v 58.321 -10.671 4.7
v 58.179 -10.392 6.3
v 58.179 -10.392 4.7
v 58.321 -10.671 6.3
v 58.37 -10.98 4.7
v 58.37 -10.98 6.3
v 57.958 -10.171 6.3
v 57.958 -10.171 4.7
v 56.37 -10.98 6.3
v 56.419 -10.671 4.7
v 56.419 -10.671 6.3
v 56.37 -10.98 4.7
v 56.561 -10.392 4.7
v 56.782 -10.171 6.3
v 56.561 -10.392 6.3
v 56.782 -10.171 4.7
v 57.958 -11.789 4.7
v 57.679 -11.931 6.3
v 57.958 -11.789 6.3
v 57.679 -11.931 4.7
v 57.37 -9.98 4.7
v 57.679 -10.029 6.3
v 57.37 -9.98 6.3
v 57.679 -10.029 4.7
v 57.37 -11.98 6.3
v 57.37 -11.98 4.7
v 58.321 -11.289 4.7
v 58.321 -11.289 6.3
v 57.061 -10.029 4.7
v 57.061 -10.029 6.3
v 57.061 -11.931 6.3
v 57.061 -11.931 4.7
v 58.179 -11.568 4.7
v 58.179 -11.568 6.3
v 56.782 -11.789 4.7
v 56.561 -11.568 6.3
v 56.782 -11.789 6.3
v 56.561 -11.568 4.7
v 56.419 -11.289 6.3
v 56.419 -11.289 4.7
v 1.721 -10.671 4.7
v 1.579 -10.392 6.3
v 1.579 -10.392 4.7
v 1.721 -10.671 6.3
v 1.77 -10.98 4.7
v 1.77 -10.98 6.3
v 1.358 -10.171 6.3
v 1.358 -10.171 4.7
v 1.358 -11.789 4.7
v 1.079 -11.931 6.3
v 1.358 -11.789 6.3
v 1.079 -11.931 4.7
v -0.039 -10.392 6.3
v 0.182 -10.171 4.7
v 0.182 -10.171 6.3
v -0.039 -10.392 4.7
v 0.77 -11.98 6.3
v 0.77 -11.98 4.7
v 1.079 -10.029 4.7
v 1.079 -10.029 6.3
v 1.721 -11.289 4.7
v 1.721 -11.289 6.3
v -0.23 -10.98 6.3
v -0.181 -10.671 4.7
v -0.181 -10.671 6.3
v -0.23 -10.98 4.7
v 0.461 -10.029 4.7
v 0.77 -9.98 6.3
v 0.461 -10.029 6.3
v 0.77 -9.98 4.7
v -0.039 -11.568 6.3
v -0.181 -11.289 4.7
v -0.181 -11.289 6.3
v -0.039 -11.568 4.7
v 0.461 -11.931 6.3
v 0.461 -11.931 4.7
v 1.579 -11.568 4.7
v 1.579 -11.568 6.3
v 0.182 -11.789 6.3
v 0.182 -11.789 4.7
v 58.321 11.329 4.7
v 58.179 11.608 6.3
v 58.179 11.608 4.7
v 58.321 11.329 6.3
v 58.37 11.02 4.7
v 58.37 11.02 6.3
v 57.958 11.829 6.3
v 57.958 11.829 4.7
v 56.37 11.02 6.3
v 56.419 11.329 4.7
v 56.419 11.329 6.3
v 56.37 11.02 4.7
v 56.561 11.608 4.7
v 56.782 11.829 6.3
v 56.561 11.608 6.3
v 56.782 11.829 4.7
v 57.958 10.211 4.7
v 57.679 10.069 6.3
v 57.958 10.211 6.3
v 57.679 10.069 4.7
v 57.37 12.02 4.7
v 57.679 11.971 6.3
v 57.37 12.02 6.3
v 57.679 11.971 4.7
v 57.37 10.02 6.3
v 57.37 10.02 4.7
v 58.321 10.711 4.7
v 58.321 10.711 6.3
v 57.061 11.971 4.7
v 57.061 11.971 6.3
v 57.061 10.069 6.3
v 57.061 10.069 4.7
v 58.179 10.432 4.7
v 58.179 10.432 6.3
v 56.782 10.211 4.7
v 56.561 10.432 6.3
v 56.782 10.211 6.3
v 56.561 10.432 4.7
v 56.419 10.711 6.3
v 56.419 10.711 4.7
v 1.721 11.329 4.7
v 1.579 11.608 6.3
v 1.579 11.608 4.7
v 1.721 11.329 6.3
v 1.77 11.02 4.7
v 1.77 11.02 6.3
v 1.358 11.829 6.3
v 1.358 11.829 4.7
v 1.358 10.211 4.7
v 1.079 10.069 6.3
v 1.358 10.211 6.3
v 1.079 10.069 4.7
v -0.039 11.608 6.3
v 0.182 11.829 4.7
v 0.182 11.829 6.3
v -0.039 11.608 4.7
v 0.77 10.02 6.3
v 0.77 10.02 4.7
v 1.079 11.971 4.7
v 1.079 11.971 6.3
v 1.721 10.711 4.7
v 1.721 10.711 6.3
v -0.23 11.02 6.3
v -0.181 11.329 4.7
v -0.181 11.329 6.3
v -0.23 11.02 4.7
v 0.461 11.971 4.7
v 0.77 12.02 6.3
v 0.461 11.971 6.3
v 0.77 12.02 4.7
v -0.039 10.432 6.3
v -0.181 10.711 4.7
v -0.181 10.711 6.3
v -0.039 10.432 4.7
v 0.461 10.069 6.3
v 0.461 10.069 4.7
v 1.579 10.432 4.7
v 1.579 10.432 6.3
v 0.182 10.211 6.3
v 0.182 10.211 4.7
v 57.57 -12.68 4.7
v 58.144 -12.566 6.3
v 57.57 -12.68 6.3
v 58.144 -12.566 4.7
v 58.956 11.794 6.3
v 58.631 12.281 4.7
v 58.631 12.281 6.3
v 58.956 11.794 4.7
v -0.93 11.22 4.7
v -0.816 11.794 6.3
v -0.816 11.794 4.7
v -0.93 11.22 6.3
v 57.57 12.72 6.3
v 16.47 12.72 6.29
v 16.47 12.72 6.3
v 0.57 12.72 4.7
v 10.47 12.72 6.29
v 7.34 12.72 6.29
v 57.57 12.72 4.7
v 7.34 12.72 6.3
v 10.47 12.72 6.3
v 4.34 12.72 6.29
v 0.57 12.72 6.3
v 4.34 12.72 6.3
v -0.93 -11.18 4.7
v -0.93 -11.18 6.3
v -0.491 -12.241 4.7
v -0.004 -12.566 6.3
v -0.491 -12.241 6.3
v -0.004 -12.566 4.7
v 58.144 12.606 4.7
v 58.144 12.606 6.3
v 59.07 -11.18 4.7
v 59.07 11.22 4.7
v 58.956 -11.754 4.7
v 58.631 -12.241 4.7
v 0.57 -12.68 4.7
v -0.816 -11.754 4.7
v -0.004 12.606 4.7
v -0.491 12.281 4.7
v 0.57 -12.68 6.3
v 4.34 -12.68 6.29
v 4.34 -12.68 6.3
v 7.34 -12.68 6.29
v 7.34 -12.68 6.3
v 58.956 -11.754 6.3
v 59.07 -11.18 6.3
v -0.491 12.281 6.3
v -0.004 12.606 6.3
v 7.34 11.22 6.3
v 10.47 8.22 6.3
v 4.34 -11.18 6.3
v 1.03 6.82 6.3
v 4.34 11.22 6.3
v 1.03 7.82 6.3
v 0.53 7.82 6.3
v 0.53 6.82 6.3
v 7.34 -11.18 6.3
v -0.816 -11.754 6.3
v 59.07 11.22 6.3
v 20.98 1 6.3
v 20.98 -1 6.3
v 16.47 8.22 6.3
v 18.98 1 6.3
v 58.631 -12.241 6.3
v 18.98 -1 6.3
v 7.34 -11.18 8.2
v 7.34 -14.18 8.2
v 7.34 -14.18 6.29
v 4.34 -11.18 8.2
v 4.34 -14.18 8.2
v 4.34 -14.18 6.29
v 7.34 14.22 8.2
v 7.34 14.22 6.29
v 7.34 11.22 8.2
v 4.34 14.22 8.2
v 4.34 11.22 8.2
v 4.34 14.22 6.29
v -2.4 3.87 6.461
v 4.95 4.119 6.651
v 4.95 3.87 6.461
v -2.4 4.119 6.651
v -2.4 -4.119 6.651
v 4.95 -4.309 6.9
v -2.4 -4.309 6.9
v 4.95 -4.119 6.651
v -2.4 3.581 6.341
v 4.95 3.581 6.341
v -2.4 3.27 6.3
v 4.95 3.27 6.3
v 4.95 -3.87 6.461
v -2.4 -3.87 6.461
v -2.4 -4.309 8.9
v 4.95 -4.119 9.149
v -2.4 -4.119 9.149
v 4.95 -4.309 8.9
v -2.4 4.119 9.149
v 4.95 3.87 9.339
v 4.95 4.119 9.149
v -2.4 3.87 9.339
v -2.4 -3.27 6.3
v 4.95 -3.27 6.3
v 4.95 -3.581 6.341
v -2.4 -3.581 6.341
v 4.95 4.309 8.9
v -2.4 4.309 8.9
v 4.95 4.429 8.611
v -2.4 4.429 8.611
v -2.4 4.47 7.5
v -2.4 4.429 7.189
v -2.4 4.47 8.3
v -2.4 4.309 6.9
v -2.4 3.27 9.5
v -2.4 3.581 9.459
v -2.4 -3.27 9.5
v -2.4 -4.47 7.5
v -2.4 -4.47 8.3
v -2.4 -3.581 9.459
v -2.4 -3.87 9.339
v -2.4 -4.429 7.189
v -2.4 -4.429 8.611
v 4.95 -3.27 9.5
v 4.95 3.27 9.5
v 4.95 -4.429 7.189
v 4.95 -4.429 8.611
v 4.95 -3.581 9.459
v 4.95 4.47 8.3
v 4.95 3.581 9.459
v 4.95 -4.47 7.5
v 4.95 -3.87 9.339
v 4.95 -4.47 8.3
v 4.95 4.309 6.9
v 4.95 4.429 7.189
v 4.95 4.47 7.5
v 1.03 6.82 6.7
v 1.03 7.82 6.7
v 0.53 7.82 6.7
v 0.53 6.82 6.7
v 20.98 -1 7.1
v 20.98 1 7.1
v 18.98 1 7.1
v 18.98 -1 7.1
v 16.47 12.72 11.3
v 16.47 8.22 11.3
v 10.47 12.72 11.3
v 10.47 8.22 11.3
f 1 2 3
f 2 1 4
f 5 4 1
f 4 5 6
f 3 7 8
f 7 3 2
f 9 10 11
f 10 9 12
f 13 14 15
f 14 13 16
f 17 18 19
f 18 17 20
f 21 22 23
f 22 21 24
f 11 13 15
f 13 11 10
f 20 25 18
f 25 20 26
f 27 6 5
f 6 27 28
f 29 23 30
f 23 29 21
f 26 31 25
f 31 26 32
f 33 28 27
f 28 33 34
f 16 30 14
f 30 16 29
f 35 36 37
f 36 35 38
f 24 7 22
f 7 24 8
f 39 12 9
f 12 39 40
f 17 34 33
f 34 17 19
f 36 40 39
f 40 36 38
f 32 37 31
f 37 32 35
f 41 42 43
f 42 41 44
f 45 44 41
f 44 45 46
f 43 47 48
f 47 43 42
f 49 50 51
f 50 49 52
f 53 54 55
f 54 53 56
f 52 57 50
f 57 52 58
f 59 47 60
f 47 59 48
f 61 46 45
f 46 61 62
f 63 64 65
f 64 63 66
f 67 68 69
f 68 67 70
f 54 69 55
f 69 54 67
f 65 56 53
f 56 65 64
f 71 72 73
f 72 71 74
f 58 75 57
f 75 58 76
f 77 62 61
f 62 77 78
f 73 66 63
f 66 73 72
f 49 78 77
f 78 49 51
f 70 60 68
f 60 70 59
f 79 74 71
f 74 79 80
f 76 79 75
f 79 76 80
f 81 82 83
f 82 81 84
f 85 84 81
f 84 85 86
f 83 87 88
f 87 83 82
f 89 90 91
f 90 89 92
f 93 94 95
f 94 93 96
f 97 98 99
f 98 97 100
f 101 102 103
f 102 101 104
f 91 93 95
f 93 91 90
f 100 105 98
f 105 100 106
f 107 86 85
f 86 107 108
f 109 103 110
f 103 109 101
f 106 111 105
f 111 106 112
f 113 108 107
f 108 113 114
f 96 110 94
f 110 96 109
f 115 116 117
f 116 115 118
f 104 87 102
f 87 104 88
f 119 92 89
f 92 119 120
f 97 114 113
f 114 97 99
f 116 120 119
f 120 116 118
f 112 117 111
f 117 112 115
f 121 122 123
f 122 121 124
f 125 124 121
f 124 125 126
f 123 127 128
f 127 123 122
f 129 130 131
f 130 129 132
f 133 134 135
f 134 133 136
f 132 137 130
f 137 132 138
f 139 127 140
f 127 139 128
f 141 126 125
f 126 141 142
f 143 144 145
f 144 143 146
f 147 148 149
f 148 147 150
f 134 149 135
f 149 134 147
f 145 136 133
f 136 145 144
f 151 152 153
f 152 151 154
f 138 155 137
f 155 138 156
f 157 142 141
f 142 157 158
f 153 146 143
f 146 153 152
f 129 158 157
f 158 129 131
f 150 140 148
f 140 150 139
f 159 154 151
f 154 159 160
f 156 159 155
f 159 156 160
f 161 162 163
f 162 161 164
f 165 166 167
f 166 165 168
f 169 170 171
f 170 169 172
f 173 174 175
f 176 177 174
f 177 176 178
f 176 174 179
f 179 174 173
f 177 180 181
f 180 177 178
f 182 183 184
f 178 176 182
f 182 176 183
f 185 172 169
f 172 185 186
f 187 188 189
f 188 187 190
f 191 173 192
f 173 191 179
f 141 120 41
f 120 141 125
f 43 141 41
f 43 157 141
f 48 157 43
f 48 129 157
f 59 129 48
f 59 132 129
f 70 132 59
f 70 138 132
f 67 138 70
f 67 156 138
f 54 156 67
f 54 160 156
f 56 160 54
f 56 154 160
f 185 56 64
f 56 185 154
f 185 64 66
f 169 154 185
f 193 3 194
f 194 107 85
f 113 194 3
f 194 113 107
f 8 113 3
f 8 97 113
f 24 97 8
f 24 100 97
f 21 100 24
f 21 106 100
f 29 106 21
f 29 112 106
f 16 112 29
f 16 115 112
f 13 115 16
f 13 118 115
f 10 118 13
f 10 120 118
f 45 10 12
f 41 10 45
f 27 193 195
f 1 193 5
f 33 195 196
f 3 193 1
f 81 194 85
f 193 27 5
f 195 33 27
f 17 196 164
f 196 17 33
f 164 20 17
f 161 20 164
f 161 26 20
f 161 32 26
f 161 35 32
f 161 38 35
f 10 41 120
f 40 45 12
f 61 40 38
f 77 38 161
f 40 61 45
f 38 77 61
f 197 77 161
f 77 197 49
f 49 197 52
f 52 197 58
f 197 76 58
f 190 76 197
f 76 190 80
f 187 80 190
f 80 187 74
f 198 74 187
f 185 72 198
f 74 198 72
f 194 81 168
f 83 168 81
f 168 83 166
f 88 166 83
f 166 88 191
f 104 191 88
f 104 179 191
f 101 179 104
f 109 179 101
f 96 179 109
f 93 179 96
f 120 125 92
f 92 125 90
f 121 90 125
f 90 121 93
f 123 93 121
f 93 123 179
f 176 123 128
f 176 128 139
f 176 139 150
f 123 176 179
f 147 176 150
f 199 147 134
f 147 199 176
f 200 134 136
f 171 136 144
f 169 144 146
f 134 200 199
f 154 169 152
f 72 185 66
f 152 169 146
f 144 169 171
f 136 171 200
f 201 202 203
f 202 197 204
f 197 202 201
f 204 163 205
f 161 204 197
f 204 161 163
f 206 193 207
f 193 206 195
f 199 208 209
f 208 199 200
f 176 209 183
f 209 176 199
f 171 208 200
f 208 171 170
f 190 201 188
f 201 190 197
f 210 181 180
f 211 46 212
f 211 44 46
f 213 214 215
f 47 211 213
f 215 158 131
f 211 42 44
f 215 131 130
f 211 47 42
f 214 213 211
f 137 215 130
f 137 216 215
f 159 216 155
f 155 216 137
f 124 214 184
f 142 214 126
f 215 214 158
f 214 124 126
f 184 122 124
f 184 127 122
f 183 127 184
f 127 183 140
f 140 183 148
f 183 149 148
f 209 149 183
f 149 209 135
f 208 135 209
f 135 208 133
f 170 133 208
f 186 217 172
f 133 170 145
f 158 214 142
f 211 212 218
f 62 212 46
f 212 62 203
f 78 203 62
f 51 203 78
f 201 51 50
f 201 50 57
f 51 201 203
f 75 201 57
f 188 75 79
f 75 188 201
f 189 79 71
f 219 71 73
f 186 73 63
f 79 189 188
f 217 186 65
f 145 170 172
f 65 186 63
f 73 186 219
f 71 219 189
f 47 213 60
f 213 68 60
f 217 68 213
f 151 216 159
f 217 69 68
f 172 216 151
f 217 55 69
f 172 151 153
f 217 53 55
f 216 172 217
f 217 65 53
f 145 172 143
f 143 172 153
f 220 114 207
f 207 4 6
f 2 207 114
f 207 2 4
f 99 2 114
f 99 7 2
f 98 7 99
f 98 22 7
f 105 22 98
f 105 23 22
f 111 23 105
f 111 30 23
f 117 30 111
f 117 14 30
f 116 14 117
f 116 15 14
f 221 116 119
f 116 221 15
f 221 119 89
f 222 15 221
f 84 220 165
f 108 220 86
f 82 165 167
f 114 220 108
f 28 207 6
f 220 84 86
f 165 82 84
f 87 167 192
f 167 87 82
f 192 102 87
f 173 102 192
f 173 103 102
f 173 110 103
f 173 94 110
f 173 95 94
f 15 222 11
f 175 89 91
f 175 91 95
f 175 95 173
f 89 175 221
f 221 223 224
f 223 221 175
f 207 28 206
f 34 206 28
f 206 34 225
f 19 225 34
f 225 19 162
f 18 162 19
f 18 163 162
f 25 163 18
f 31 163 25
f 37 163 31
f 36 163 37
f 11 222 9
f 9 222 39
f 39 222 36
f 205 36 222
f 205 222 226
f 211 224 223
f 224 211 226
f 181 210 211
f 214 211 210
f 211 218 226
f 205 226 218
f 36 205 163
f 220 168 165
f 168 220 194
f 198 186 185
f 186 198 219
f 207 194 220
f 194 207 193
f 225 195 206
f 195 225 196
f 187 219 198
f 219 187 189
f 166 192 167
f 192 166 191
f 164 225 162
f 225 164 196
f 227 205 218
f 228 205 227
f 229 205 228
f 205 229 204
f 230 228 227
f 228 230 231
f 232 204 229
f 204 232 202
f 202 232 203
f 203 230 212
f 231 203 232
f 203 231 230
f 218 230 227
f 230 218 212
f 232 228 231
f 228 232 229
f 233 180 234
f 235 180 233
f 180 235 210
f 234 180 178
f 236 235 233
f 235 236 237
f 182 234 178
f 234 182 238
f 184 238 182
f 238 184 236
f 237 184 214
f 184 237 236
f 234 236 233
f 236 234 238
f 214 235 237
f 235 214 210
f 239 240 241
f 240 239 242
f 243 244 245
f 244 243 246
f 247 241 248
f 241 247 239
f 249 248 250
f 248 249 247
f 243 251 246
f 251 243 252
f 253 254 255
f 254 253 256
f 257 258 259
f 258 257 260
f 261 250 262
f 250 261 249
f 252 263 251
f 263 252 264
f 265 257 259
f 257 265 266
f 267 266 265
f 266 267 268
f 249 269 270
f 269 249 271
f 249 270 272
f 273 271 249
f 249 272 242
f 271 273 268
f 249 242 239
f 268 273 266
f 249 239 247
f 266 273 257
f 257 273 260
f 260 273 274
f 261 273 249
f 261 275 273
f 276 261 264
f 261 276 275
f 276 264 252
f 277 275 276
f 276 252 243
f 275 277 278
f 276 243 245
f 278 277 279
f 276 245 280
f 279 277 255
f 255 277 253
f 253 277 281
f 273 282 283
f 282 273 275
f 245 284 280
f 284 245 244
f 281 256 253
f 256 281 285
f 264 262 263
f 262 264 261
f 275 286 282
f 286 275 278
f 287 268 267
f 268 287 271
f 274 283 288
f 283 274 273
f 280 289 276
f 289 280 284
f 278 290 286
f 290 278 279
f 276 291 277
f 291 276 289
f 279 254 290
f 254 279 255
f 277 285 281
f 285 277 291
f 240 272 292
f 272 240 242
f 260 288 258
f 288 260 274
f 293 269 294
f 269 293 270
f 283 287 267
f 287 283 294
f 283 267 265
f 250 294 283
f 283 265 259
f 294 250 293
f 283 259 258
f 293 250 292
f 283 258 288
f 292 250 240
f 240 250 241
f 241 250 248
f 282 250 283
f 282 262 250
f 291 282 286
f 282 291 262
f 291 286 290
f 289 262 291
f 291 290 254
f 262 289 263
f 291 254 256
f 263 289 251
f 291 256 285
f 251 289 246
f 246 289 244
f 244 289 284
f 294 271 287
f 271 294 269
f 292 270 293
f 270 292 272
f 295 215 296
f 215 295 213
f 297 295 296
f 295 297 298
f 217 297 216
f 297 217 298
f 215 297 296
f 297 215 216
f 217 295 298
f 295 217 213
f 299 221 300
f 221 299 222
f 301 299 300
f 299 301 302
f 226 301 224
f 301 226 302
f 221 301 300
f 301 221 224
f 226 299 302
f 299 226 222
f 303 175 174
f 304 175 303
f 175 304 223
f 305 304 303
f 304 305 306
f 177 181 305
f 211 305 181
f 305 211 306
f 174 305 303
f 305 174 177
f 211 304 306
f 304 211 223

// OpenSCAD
// file: ../../screw-post/screw-post.scad
//-----------------------------------------------------------------------
// Screw post: a round post off the floor that a board screws down onto
//
// Two ways to fix:
//   "nut"  clearance hole through the post and floor; the nut sits in a hex
//          trap in the floor's underside, so the screw goes in from the top
//   "tap"  a pilot hole the screw cuts its own thread in (one or two fittings
//          in PLA/PETG); blind, the floor stays whole underneath
// and "head" for a screw up from below (head in a counterbore, nut on top).
//
// Modules, all in the same frame:
//   screwPostGhost()     the screw (and nut), for previews
//   screwPost()          the post: add to the floor
//   screwPostFloorCut()  subtract from the floor: nut trap / counterbore and hole
//
// Frame: origin on the floor top, on the post's axis. Z up; the floor is
// Z = -floorThick .. 0. Units: mm.
//
// Sizes: "M2", "M2.5", "M3". screwPostScrew(size, ...) says which screw length
// reaches, so a project can assert it has that screw in the kit.
//-----------------------------------------------------------------------

//-- [name, screw Ø, nut across flats, nut thick, head Ø, head height, tap hole, post Ø]
//-- Nuts ISO 4032; heads ISO 7380 button. Tap holes: the usual ~0.8 x Ø for plastic
screwSizes = [
  ["M2",   2.0, 4.0, 1.6, 3.5, 1.1, 1.6, 5.0],
  ["M2.5", 2.5, 5.0, 2.0, 4.4, 1.4, 2.1, 6.0],    // head 4.4: measured on the kit's M2.5 (controller base)
  ["M3",   3.0, 5.5, 2.4, 5.7, 1.65, 2.5, 7.0],
];

screwHoleClear = 0.4;     // added to the screw Ø for a clearance hole
screwNutClear  = 0.3;     // CAL: across flats, nut trap over the nut. Set by the fit piece
screwTapClear  = 0.0;     // CAL: added to the tap hole. Set by the fit piece
screwHeadClear = 0.6;     // counterbore over the head Ø

function screwSize(size) = let (i = search([size], screwSizes)[0])
  assert(i != [] && i != undef, str("unknown screw size ", size)) screwSizes[i];
function screwDia(size)    = screwSize(size)[1];
function screwNutAF(size)  = screwSize(size)[2];
function screwNutH(size)   = screwSize(size)[3];
function screwHeadDia(size)= screwSize(size)[4];
function screwHeadH(size)  = screwSize(size)[5];
function screwPostDia(size)= screwSize(size)[7];

//-- Shortest screw that fills the nut, from the top of the clamped part (h + clamp
//-- above the floor) down to the nut trap's underside. Round up to a length you have.
function screwPostScrew(size, h, floorThick, clamp = 1.6) = h + clamp + floorThick;

module screwPostGhost(size, h, floorThick, clamp = 1.6, length, how = "nut")
{
  d = screwDia(size);
  L = is_undef(length) ? screwPostScrew(size, h, floorThick, clamp) : length;
  top = h + clamp;
  if (how == "head")
  {
    %color("Silver") translate([0, 0, -floorThick]) cylinder(d = screwHeadDia(size), h = screwHeadH(size), $fn = 24);
    %color("Silver") translate([0, 0, -floorThick + screwHeadH(size)]) cylinder(d = d, h = L, $fn = 16);
  }
  else
  {
    %color("Silver") translate([0, 0, top]) cylinder(d = screwHeadDia(size), h = screwHeadH(size), $fn = 24);
    %color("Silver") translate([0, 0, top - L]) cylinder(d = d, h = L, $fn = 16);
    if (how == "nut")
      %color("DimGray") translate([0, 0, -floorThick]) rotate([0, 0, 30]) cylinder(d = screwNutAF(size)/cos(30), h = screwNutH(size), $fn = 6);
  }
}

//-- how: "nut" | "head" (through hole) or "tap" (blind pilot hole). postDia defaults by size
module screwPost(size, h, how = "nut", postDia, tapClear = screwTapClear)
{
  pd = is_undef(postDia) ? screwPostDia(size) : postDia;
  hole = how == "tap" ? screwSize(size)[6] + tapClear : screwDia(size) + screwHoleClear;
  difference()
  {
    translate([0, 0, -0.01]) cylinder(d = pd, h = h + 0.01, $fn = 40);
    translate([0, 0, how == "tap" ? 0.6 : -1]) cylinder(d = hole, h = h + 2, $fn = 24);
    //-- lead-in so the screw starts square
    translate([0, 0, h - 0.4]) cylinder(d1 = hole, d2 = hole + 0.8, h = 0.41, $fn = 24);
  }
}

//-- "nut": hex trap from the underside, opening a little over the nut so it sits flush.
//-- "head": counterbore for the head. "tap": nothing.
module screwPostFloorCut(size, floorThick, how = "nut", nutClear = screwNutClear)
{
  d = screwDia(size) + screwHoleClear;
  if (how == "nut")
  {
    af = screwNutAF(size) + nutClear;
    translate([0, 0, -floorThick - 1]) rotate([0, 0, 30]) cylinder(d = af/cos(30), h = screwNutH(size) + 0.1 + 1, $fn = 6);
    translate([0, 0, -floorThick - 1]) cylinder(d = d + 0.4, h = floorThick + 2, $fn = 24);
  }
  if (how == "head")
  {
    translate([0, 0, -floorThick - 1]) cylinder(d = screwHeadDia(size) + screwHeadClear, h = screwHeadH(size) + 0.2 + 1, $fn = 32);
    translate([0, 0, -floorThick - 1]) cylinder(d = d + 0.4, h = floorThick + 2, $fn = 24);
  }
  assert(how == "tap" || floorThick >= (how == "nut" ? screwNutH(size) : screwHeadH(size)) + 0.1 + 0.3,
         str("floor too thin for the ", size, " ", how));
}
// file: ../../usb-c-port/usb-c-port.scad
//-----------------------------------------------------------------------
// USB-C port through a wall, flush: the socket's metal shell sits in a
// close-fitting pocket in the wall, walled in on all four sides, its face
// level with the outside. The cable seats the way it does on a laptop.
//
// A board's socket only overhangs the board edge by a mm or so, less than
// the wall. So the board's end tucks into a shallow relief in the wall's
// inner face, the width of the board, leaving the wall round the socket
// thin enough for the face to reach the outside. When that would leave less
// than usbcMinWall (a socket that barely overhangs), the face sits back from
// the outside instead: usbcRecess() says how far.
//
// Modules, all in the same frame:
//   usbcGhost()     the socket and the board's end, for previews
//   usbcWallCut()   subtract from the wall: socket pocket and board relief
//
// Frame: origin on the floor top at the wall's inner face, under the socket's
// axis. +X into the box, Z up. The wall is X = -wall .. 0. The board is
// component side up, socket on top (top-mount, as on the FireBeetle, C3 Super
// Mini and S3 DevKitC). Units: mm.
//
// usbcBoardEdgeX() gives where the board's edge lands (negative: inside the
// wall), so a holder can put its posts or pocket to match.
//-----------------------------------------------------------------------

//-- The socket: USB-C receptacle shell (USB-IF 8.34 x 2.56 plug, receptacle shell ~8.94 x 3.26)
usbcShellW     = 8.94;
usbcShellH     = 3.26;    // CAL per board: measured 3.2 on the FireBeetle
usbcShellR     = 1.2;     // CAL: end radius. Full round would be 1.63; most shells are squarer
usbcShellDepth = 7.35;    // face to back

//-- The pocket
usbcClearance  = 0.15;    // CAL: per side, shell to pocket. Set by the fit piece
usbcMinWall    = 1.0;     // thinnest wall left round the socket
usbcReliefGap  = 0.3;     // board relief over the board, each side and above/below
usbcChamfer    = 0.3;     // lead-in on the outside edge

//-- How far the socket face sits back from the outside: 0 (flush) unless the socket
//-- overhangs the board edge by less than usbcMinWall
function usbcRecess(overhang, minWall = usbcMinWall) = max(0, minWall - overhang);
//-- X of the board's socket edge in this frame
function usbcBoardEdgeX(wall, overhang, recess) =
  -wall + (is_undef(recess) ? usbcRecess(overhang) : recess) + overhang;
//-- Z of the board's underside above the floor top
function usbcBoardZ(axisZ, pcb, shellH = usbcShellH) = axisZ - shellH/2 - pcb;

module usbcShell2D(grow = 0, w = usbcShellW, h = usbcShellH, r = usbcShellR)
{
  offset(r = r + grow, $fn = 24) square([w - 2*r, h - 2*r], center = true);
}

//-- axisZ: socket axis above the floor. boardW/pcb: the board, for the ghost and relief.
//-- shift: socket centre across the board's width from the board's centre line (+Y)
module usbcGhost(axisZ, wall, overhang, boardW, pcb = 1.6, recess, shift = 0, shellH = usbcShellH, shellW = usbcShellW)
{
  ex = usbcBoardEdgeX(wall, overhang, recess);
  %color("Silver") translate([ex - overhang, 0, axisZ]) rotate([0, 90, 0]) rotate([0, 0, 90])
    linear_extrude(usbcShellDepth) usbcShell2D(w = shellW, h = shellH);
  %color("DarkSlateGray") translate([ex, -boardW/2 - shift, usbcBoardZ(axisZ, pcb, shellH)]) cube([12, boardW, pcb]);
}

module usbcWallCut(axisZ, wall, overhang, boardW, pcb = 1.6, recess, shift = 0,
                   clearance = usbcClearance, shellH = usbcShellH, shellW = usbcShellW, aboveBoard)
{
  rc = is_undef(recess) ? usbcRecess(overhang) : recess;
  ex = usbcBoardEdgeX(wall, overhang, rc);
  bz = usbcBoardZ(axisZ, pcb, shellH);
  //-- what stands on the board near its edge: the socket, unless told taller
  up = is_undef(aboveBoard) ? shellH : aboveBoard;
  assert(ex - overhang + wall >= -0.01, "socket face would stand proud of the wall");
  assert(rc > 0 || overhang >= usbcMinWall - 0.01, "wall round the socket under usbcMinWall");
  //-- socket pocket, through the wall
  translate([-wall - 1, 0, axisZ]) rotate([0, 90, 0]) rotate([0, 0, 90])
    linear_extrude(wall + 2) usbcShell2D(clearance, w = shellW, h = shellH);
  //-- lead-in chamfer on the outside
  translate([-wall, 0, axisZ]) rotate([0, 90, 0]) rotate([0, 0, 90])
    hull()
    {
      translate([0, 0, -0.01]) linear_extrude(0.01) usbcShell2D(clearance + usbcChamfer, w = shellW, h = shellH);
      translate([0, 0, usbcChamfer]) linear_extrude(0.01) usbcShell2D(clearance, w = shellW, h = shellH);
    }
  //-- board relief in the inner face, when the board's edge lands inside the wall
  if (ex < 0)
    translate([ex - usbcReliefGap, -boardW/2 - shift - usbcReliefGap, bz - usbcReliefGap])
      cube([-ex + usbcReliefGap + 1, boardW + 2*usbcReliefGap, pcb + up + 2*usbcReliefGap]);
}
// main file
// The board as a solid, for the catalogue (the Ghost is % so it never renders):
// PCB, USB-C socket, charge LED, RGB LED, side buttons, battery socket.
// One board per entry in shifts, at the fit piece's pitch.
include <../firebeetle-esp32e.scad>

variant = "ESP32-E";
wall    = 2.4;
postH   = 4.7;
shifts  = [0];      // postShift per board
pitch   = 32;

module fbSolid(v, wall, postH, postShift)
{
  f = fbVariant(v);
  L = fbLength(v); W = fbWidth(v); pcb = fbPcb(v);
  ex = fbEdgeX(v, wall, postShift);
  top = postH + pcb;
  difference()
  {
    translate([ex, -f[9], postH]) linear_extrude(pcb)
      offset(r = fbCornerR, $fn = 16) offset(delta = -fbCornerR) square([L, W]);
    for (h = fbHoles(v, wall, postShift))
      translate([h[0], h[1], postH - 1]) cylinder(d = 2.0, h = pcb + 2, $fn = 20);
  }
  translate([ex - fbOverhang(v), 0, fbAxisZ(v, postH)]) rotate([0, 90, 0]) rotate([0, 0, 90])
    linear_extrude(fbUsbDepth) usbcShell2D(h = fbShellH(v));
  led = fbToFrame(v, wall, f[12][0], f[12][1], postShift);
  translate([led[0] - 0.25, led[1] - 0.5, top - 0.01]) cube([0.5, 1.0, 0.41]);
  if (len(f[13]) == 2)
  {
    rgb = fbToFrame(v, wall, f[13][0], f[13][1], postShift);
    translate([rgb[0] - 1, rgb[1] - 1, top - 0.01]) cube([2, 2, 0.81]);
  }
  if (f[14] > 0)
    for (bx = [0, W])
    {
      b = fbToFrame(v, wall, bx, f[14], postShift);
      translate([b[0] - 1.5, b[1] - 1.5, top - 0.01]) cube([3, 3, 1.91]);
    }
  if (f[15] > 0)
  {
    b = fbToFrame(v, wall, W, f[15], postShift);
    translate([b[0] - 3, b[1] - 4.5, top - 0.01]) cube([6, 4.5, 5.01]);
  }
}

for (i = [0 : len(shifts) - 1]) translate([0, i*pitch, 0]) fbSolid(variant, wall, postH, shifts[i]);
